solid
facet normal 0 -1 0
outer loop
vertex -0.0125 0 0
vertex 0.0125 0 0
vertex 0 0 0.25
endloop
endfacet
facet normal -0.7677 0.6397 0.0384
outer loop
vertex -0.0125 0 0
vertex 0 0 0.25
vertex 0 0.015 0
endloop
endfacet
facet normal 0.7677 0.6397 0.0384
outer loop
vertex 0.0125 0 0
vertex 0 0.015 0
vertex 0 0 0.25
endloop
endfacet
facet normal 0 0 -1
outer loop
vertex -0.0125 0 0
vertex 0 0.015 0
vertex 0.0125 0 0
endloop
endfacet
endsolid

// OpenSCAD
polyhedron(
    points = [[-0.0125, 0, 0], [0, 0.015, 0], [0.0125, 0, 0], [0, 0, 0.25]],
    faces = [[3, 2, 0], [1, 3, 0], [3, 1, 2], [2, 1, 0]],
    convexity = 10);
